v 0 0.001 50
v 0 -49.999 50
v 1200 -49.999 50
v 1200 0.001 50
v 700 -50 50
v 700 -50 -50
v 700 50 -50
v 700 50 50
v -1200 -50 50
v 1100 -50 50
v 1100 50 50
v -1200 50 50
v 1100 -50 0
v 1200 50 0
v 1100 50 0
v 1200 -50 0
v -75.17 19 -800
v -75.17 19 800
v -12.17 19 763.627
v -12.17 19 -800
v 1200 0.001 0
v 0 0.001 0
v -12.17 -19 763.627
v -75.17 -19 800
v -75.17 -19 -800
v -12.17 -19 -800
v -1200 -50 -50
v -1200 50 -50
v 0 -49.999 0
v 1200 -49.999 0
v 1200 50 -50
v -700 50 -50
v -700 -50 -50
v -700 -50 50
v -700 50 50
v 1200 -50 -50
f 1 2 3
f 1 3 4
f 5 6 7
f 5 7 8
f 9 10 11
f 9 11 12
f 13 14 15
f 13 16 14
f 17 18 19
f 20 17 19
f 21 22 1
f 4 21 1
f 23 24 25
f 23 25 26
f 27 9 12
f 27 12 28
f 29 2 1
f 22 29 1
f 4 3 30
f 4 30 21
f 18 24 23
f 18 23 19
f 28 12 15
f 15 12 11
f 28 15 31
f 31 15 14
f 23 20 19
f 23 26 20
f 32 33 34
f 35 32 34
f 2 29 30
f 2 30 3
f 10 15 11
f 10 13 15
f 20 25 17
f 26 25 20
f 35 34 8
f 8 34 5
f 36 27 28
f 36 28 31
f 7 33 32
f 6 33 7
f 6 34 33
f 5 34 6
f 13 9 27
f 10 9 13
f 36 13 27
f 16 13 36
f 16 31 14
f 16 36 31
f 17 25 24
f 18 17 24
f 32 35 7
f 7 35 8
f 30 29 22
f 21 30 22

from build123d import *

# Parameters (mm, degrees)
F1_DEPTH = 50
F2_W     = 1400
F2_H     = 100
F3_DEPTH = 50
F4_W     = 63
F4_H     = 1600
F5_DEPTH = 19
F6_SIZE2 = 36.373057
F6_SIZE  = 62.99999
F7_W     = 50
F7_H     = 50
F8_DEPTH = 1200


# Not quite as in the source:
# - a fillet or chamfer is up to 0.001 mm smaller than in the source, because OpenCascade refuses the exact size


with BuildPart() as f1:
    # F0 (on Front) → F1 (new body, symmetric)
    with BuildSketch(Plane.XZ):
        Polygon((1100, 0), (1100, 50), (-1200, 50), (-1200, -50), (1200, -50), (1200, 0), align=None)
    extrude(amount=F1_DEPTH, both=True)


with BuildPart() as f3:
    # F2 (on Front) → F3 (new body, symmetric)
    with BuildSketch(Plane.XZ):
        Rectangle(F2_W, F2_H)
    extrude(amount=F3_DEPTH, both=True)


with BuildPart() as f5:
    # F4 (on Front) → F5 (new body, symmetric)
    with BuildSketch(Plane.XZ):
        with Locations((-43.6704657625, 0)):
            Rectangle(F4_W, F4_H)
    extrude(amount=F5_DEPTH, both=True)

    # F6 (size 63 and 36.3730669589 in the source; OpenCascade refuses exactly that, so slightly less here)
    f6_edges = [f5.edges().sort_by_distance(p)[0] for p in [
        (-12.170466, 0, 800),
    ]]
    f6_side = f5.faces().sort_by_distance((-43.670466, 0, 800))[0]
    chamfer(f6_edges, length=F6_SIZE, length2=F6_SIZE2, reference=f6_side)


with BuildPart() as f8:
    # F7 (on Right) → F8 (new body)
    with BuildSketch(Plane.YZ):
        with Locations((-24.9985475093, 25)):
            Rectangle(F7_W, F7_H)
    extrude(amount=F8_DEPTH)


solid = Compound([f1.part, f3.part, f5.part, f8.part])
